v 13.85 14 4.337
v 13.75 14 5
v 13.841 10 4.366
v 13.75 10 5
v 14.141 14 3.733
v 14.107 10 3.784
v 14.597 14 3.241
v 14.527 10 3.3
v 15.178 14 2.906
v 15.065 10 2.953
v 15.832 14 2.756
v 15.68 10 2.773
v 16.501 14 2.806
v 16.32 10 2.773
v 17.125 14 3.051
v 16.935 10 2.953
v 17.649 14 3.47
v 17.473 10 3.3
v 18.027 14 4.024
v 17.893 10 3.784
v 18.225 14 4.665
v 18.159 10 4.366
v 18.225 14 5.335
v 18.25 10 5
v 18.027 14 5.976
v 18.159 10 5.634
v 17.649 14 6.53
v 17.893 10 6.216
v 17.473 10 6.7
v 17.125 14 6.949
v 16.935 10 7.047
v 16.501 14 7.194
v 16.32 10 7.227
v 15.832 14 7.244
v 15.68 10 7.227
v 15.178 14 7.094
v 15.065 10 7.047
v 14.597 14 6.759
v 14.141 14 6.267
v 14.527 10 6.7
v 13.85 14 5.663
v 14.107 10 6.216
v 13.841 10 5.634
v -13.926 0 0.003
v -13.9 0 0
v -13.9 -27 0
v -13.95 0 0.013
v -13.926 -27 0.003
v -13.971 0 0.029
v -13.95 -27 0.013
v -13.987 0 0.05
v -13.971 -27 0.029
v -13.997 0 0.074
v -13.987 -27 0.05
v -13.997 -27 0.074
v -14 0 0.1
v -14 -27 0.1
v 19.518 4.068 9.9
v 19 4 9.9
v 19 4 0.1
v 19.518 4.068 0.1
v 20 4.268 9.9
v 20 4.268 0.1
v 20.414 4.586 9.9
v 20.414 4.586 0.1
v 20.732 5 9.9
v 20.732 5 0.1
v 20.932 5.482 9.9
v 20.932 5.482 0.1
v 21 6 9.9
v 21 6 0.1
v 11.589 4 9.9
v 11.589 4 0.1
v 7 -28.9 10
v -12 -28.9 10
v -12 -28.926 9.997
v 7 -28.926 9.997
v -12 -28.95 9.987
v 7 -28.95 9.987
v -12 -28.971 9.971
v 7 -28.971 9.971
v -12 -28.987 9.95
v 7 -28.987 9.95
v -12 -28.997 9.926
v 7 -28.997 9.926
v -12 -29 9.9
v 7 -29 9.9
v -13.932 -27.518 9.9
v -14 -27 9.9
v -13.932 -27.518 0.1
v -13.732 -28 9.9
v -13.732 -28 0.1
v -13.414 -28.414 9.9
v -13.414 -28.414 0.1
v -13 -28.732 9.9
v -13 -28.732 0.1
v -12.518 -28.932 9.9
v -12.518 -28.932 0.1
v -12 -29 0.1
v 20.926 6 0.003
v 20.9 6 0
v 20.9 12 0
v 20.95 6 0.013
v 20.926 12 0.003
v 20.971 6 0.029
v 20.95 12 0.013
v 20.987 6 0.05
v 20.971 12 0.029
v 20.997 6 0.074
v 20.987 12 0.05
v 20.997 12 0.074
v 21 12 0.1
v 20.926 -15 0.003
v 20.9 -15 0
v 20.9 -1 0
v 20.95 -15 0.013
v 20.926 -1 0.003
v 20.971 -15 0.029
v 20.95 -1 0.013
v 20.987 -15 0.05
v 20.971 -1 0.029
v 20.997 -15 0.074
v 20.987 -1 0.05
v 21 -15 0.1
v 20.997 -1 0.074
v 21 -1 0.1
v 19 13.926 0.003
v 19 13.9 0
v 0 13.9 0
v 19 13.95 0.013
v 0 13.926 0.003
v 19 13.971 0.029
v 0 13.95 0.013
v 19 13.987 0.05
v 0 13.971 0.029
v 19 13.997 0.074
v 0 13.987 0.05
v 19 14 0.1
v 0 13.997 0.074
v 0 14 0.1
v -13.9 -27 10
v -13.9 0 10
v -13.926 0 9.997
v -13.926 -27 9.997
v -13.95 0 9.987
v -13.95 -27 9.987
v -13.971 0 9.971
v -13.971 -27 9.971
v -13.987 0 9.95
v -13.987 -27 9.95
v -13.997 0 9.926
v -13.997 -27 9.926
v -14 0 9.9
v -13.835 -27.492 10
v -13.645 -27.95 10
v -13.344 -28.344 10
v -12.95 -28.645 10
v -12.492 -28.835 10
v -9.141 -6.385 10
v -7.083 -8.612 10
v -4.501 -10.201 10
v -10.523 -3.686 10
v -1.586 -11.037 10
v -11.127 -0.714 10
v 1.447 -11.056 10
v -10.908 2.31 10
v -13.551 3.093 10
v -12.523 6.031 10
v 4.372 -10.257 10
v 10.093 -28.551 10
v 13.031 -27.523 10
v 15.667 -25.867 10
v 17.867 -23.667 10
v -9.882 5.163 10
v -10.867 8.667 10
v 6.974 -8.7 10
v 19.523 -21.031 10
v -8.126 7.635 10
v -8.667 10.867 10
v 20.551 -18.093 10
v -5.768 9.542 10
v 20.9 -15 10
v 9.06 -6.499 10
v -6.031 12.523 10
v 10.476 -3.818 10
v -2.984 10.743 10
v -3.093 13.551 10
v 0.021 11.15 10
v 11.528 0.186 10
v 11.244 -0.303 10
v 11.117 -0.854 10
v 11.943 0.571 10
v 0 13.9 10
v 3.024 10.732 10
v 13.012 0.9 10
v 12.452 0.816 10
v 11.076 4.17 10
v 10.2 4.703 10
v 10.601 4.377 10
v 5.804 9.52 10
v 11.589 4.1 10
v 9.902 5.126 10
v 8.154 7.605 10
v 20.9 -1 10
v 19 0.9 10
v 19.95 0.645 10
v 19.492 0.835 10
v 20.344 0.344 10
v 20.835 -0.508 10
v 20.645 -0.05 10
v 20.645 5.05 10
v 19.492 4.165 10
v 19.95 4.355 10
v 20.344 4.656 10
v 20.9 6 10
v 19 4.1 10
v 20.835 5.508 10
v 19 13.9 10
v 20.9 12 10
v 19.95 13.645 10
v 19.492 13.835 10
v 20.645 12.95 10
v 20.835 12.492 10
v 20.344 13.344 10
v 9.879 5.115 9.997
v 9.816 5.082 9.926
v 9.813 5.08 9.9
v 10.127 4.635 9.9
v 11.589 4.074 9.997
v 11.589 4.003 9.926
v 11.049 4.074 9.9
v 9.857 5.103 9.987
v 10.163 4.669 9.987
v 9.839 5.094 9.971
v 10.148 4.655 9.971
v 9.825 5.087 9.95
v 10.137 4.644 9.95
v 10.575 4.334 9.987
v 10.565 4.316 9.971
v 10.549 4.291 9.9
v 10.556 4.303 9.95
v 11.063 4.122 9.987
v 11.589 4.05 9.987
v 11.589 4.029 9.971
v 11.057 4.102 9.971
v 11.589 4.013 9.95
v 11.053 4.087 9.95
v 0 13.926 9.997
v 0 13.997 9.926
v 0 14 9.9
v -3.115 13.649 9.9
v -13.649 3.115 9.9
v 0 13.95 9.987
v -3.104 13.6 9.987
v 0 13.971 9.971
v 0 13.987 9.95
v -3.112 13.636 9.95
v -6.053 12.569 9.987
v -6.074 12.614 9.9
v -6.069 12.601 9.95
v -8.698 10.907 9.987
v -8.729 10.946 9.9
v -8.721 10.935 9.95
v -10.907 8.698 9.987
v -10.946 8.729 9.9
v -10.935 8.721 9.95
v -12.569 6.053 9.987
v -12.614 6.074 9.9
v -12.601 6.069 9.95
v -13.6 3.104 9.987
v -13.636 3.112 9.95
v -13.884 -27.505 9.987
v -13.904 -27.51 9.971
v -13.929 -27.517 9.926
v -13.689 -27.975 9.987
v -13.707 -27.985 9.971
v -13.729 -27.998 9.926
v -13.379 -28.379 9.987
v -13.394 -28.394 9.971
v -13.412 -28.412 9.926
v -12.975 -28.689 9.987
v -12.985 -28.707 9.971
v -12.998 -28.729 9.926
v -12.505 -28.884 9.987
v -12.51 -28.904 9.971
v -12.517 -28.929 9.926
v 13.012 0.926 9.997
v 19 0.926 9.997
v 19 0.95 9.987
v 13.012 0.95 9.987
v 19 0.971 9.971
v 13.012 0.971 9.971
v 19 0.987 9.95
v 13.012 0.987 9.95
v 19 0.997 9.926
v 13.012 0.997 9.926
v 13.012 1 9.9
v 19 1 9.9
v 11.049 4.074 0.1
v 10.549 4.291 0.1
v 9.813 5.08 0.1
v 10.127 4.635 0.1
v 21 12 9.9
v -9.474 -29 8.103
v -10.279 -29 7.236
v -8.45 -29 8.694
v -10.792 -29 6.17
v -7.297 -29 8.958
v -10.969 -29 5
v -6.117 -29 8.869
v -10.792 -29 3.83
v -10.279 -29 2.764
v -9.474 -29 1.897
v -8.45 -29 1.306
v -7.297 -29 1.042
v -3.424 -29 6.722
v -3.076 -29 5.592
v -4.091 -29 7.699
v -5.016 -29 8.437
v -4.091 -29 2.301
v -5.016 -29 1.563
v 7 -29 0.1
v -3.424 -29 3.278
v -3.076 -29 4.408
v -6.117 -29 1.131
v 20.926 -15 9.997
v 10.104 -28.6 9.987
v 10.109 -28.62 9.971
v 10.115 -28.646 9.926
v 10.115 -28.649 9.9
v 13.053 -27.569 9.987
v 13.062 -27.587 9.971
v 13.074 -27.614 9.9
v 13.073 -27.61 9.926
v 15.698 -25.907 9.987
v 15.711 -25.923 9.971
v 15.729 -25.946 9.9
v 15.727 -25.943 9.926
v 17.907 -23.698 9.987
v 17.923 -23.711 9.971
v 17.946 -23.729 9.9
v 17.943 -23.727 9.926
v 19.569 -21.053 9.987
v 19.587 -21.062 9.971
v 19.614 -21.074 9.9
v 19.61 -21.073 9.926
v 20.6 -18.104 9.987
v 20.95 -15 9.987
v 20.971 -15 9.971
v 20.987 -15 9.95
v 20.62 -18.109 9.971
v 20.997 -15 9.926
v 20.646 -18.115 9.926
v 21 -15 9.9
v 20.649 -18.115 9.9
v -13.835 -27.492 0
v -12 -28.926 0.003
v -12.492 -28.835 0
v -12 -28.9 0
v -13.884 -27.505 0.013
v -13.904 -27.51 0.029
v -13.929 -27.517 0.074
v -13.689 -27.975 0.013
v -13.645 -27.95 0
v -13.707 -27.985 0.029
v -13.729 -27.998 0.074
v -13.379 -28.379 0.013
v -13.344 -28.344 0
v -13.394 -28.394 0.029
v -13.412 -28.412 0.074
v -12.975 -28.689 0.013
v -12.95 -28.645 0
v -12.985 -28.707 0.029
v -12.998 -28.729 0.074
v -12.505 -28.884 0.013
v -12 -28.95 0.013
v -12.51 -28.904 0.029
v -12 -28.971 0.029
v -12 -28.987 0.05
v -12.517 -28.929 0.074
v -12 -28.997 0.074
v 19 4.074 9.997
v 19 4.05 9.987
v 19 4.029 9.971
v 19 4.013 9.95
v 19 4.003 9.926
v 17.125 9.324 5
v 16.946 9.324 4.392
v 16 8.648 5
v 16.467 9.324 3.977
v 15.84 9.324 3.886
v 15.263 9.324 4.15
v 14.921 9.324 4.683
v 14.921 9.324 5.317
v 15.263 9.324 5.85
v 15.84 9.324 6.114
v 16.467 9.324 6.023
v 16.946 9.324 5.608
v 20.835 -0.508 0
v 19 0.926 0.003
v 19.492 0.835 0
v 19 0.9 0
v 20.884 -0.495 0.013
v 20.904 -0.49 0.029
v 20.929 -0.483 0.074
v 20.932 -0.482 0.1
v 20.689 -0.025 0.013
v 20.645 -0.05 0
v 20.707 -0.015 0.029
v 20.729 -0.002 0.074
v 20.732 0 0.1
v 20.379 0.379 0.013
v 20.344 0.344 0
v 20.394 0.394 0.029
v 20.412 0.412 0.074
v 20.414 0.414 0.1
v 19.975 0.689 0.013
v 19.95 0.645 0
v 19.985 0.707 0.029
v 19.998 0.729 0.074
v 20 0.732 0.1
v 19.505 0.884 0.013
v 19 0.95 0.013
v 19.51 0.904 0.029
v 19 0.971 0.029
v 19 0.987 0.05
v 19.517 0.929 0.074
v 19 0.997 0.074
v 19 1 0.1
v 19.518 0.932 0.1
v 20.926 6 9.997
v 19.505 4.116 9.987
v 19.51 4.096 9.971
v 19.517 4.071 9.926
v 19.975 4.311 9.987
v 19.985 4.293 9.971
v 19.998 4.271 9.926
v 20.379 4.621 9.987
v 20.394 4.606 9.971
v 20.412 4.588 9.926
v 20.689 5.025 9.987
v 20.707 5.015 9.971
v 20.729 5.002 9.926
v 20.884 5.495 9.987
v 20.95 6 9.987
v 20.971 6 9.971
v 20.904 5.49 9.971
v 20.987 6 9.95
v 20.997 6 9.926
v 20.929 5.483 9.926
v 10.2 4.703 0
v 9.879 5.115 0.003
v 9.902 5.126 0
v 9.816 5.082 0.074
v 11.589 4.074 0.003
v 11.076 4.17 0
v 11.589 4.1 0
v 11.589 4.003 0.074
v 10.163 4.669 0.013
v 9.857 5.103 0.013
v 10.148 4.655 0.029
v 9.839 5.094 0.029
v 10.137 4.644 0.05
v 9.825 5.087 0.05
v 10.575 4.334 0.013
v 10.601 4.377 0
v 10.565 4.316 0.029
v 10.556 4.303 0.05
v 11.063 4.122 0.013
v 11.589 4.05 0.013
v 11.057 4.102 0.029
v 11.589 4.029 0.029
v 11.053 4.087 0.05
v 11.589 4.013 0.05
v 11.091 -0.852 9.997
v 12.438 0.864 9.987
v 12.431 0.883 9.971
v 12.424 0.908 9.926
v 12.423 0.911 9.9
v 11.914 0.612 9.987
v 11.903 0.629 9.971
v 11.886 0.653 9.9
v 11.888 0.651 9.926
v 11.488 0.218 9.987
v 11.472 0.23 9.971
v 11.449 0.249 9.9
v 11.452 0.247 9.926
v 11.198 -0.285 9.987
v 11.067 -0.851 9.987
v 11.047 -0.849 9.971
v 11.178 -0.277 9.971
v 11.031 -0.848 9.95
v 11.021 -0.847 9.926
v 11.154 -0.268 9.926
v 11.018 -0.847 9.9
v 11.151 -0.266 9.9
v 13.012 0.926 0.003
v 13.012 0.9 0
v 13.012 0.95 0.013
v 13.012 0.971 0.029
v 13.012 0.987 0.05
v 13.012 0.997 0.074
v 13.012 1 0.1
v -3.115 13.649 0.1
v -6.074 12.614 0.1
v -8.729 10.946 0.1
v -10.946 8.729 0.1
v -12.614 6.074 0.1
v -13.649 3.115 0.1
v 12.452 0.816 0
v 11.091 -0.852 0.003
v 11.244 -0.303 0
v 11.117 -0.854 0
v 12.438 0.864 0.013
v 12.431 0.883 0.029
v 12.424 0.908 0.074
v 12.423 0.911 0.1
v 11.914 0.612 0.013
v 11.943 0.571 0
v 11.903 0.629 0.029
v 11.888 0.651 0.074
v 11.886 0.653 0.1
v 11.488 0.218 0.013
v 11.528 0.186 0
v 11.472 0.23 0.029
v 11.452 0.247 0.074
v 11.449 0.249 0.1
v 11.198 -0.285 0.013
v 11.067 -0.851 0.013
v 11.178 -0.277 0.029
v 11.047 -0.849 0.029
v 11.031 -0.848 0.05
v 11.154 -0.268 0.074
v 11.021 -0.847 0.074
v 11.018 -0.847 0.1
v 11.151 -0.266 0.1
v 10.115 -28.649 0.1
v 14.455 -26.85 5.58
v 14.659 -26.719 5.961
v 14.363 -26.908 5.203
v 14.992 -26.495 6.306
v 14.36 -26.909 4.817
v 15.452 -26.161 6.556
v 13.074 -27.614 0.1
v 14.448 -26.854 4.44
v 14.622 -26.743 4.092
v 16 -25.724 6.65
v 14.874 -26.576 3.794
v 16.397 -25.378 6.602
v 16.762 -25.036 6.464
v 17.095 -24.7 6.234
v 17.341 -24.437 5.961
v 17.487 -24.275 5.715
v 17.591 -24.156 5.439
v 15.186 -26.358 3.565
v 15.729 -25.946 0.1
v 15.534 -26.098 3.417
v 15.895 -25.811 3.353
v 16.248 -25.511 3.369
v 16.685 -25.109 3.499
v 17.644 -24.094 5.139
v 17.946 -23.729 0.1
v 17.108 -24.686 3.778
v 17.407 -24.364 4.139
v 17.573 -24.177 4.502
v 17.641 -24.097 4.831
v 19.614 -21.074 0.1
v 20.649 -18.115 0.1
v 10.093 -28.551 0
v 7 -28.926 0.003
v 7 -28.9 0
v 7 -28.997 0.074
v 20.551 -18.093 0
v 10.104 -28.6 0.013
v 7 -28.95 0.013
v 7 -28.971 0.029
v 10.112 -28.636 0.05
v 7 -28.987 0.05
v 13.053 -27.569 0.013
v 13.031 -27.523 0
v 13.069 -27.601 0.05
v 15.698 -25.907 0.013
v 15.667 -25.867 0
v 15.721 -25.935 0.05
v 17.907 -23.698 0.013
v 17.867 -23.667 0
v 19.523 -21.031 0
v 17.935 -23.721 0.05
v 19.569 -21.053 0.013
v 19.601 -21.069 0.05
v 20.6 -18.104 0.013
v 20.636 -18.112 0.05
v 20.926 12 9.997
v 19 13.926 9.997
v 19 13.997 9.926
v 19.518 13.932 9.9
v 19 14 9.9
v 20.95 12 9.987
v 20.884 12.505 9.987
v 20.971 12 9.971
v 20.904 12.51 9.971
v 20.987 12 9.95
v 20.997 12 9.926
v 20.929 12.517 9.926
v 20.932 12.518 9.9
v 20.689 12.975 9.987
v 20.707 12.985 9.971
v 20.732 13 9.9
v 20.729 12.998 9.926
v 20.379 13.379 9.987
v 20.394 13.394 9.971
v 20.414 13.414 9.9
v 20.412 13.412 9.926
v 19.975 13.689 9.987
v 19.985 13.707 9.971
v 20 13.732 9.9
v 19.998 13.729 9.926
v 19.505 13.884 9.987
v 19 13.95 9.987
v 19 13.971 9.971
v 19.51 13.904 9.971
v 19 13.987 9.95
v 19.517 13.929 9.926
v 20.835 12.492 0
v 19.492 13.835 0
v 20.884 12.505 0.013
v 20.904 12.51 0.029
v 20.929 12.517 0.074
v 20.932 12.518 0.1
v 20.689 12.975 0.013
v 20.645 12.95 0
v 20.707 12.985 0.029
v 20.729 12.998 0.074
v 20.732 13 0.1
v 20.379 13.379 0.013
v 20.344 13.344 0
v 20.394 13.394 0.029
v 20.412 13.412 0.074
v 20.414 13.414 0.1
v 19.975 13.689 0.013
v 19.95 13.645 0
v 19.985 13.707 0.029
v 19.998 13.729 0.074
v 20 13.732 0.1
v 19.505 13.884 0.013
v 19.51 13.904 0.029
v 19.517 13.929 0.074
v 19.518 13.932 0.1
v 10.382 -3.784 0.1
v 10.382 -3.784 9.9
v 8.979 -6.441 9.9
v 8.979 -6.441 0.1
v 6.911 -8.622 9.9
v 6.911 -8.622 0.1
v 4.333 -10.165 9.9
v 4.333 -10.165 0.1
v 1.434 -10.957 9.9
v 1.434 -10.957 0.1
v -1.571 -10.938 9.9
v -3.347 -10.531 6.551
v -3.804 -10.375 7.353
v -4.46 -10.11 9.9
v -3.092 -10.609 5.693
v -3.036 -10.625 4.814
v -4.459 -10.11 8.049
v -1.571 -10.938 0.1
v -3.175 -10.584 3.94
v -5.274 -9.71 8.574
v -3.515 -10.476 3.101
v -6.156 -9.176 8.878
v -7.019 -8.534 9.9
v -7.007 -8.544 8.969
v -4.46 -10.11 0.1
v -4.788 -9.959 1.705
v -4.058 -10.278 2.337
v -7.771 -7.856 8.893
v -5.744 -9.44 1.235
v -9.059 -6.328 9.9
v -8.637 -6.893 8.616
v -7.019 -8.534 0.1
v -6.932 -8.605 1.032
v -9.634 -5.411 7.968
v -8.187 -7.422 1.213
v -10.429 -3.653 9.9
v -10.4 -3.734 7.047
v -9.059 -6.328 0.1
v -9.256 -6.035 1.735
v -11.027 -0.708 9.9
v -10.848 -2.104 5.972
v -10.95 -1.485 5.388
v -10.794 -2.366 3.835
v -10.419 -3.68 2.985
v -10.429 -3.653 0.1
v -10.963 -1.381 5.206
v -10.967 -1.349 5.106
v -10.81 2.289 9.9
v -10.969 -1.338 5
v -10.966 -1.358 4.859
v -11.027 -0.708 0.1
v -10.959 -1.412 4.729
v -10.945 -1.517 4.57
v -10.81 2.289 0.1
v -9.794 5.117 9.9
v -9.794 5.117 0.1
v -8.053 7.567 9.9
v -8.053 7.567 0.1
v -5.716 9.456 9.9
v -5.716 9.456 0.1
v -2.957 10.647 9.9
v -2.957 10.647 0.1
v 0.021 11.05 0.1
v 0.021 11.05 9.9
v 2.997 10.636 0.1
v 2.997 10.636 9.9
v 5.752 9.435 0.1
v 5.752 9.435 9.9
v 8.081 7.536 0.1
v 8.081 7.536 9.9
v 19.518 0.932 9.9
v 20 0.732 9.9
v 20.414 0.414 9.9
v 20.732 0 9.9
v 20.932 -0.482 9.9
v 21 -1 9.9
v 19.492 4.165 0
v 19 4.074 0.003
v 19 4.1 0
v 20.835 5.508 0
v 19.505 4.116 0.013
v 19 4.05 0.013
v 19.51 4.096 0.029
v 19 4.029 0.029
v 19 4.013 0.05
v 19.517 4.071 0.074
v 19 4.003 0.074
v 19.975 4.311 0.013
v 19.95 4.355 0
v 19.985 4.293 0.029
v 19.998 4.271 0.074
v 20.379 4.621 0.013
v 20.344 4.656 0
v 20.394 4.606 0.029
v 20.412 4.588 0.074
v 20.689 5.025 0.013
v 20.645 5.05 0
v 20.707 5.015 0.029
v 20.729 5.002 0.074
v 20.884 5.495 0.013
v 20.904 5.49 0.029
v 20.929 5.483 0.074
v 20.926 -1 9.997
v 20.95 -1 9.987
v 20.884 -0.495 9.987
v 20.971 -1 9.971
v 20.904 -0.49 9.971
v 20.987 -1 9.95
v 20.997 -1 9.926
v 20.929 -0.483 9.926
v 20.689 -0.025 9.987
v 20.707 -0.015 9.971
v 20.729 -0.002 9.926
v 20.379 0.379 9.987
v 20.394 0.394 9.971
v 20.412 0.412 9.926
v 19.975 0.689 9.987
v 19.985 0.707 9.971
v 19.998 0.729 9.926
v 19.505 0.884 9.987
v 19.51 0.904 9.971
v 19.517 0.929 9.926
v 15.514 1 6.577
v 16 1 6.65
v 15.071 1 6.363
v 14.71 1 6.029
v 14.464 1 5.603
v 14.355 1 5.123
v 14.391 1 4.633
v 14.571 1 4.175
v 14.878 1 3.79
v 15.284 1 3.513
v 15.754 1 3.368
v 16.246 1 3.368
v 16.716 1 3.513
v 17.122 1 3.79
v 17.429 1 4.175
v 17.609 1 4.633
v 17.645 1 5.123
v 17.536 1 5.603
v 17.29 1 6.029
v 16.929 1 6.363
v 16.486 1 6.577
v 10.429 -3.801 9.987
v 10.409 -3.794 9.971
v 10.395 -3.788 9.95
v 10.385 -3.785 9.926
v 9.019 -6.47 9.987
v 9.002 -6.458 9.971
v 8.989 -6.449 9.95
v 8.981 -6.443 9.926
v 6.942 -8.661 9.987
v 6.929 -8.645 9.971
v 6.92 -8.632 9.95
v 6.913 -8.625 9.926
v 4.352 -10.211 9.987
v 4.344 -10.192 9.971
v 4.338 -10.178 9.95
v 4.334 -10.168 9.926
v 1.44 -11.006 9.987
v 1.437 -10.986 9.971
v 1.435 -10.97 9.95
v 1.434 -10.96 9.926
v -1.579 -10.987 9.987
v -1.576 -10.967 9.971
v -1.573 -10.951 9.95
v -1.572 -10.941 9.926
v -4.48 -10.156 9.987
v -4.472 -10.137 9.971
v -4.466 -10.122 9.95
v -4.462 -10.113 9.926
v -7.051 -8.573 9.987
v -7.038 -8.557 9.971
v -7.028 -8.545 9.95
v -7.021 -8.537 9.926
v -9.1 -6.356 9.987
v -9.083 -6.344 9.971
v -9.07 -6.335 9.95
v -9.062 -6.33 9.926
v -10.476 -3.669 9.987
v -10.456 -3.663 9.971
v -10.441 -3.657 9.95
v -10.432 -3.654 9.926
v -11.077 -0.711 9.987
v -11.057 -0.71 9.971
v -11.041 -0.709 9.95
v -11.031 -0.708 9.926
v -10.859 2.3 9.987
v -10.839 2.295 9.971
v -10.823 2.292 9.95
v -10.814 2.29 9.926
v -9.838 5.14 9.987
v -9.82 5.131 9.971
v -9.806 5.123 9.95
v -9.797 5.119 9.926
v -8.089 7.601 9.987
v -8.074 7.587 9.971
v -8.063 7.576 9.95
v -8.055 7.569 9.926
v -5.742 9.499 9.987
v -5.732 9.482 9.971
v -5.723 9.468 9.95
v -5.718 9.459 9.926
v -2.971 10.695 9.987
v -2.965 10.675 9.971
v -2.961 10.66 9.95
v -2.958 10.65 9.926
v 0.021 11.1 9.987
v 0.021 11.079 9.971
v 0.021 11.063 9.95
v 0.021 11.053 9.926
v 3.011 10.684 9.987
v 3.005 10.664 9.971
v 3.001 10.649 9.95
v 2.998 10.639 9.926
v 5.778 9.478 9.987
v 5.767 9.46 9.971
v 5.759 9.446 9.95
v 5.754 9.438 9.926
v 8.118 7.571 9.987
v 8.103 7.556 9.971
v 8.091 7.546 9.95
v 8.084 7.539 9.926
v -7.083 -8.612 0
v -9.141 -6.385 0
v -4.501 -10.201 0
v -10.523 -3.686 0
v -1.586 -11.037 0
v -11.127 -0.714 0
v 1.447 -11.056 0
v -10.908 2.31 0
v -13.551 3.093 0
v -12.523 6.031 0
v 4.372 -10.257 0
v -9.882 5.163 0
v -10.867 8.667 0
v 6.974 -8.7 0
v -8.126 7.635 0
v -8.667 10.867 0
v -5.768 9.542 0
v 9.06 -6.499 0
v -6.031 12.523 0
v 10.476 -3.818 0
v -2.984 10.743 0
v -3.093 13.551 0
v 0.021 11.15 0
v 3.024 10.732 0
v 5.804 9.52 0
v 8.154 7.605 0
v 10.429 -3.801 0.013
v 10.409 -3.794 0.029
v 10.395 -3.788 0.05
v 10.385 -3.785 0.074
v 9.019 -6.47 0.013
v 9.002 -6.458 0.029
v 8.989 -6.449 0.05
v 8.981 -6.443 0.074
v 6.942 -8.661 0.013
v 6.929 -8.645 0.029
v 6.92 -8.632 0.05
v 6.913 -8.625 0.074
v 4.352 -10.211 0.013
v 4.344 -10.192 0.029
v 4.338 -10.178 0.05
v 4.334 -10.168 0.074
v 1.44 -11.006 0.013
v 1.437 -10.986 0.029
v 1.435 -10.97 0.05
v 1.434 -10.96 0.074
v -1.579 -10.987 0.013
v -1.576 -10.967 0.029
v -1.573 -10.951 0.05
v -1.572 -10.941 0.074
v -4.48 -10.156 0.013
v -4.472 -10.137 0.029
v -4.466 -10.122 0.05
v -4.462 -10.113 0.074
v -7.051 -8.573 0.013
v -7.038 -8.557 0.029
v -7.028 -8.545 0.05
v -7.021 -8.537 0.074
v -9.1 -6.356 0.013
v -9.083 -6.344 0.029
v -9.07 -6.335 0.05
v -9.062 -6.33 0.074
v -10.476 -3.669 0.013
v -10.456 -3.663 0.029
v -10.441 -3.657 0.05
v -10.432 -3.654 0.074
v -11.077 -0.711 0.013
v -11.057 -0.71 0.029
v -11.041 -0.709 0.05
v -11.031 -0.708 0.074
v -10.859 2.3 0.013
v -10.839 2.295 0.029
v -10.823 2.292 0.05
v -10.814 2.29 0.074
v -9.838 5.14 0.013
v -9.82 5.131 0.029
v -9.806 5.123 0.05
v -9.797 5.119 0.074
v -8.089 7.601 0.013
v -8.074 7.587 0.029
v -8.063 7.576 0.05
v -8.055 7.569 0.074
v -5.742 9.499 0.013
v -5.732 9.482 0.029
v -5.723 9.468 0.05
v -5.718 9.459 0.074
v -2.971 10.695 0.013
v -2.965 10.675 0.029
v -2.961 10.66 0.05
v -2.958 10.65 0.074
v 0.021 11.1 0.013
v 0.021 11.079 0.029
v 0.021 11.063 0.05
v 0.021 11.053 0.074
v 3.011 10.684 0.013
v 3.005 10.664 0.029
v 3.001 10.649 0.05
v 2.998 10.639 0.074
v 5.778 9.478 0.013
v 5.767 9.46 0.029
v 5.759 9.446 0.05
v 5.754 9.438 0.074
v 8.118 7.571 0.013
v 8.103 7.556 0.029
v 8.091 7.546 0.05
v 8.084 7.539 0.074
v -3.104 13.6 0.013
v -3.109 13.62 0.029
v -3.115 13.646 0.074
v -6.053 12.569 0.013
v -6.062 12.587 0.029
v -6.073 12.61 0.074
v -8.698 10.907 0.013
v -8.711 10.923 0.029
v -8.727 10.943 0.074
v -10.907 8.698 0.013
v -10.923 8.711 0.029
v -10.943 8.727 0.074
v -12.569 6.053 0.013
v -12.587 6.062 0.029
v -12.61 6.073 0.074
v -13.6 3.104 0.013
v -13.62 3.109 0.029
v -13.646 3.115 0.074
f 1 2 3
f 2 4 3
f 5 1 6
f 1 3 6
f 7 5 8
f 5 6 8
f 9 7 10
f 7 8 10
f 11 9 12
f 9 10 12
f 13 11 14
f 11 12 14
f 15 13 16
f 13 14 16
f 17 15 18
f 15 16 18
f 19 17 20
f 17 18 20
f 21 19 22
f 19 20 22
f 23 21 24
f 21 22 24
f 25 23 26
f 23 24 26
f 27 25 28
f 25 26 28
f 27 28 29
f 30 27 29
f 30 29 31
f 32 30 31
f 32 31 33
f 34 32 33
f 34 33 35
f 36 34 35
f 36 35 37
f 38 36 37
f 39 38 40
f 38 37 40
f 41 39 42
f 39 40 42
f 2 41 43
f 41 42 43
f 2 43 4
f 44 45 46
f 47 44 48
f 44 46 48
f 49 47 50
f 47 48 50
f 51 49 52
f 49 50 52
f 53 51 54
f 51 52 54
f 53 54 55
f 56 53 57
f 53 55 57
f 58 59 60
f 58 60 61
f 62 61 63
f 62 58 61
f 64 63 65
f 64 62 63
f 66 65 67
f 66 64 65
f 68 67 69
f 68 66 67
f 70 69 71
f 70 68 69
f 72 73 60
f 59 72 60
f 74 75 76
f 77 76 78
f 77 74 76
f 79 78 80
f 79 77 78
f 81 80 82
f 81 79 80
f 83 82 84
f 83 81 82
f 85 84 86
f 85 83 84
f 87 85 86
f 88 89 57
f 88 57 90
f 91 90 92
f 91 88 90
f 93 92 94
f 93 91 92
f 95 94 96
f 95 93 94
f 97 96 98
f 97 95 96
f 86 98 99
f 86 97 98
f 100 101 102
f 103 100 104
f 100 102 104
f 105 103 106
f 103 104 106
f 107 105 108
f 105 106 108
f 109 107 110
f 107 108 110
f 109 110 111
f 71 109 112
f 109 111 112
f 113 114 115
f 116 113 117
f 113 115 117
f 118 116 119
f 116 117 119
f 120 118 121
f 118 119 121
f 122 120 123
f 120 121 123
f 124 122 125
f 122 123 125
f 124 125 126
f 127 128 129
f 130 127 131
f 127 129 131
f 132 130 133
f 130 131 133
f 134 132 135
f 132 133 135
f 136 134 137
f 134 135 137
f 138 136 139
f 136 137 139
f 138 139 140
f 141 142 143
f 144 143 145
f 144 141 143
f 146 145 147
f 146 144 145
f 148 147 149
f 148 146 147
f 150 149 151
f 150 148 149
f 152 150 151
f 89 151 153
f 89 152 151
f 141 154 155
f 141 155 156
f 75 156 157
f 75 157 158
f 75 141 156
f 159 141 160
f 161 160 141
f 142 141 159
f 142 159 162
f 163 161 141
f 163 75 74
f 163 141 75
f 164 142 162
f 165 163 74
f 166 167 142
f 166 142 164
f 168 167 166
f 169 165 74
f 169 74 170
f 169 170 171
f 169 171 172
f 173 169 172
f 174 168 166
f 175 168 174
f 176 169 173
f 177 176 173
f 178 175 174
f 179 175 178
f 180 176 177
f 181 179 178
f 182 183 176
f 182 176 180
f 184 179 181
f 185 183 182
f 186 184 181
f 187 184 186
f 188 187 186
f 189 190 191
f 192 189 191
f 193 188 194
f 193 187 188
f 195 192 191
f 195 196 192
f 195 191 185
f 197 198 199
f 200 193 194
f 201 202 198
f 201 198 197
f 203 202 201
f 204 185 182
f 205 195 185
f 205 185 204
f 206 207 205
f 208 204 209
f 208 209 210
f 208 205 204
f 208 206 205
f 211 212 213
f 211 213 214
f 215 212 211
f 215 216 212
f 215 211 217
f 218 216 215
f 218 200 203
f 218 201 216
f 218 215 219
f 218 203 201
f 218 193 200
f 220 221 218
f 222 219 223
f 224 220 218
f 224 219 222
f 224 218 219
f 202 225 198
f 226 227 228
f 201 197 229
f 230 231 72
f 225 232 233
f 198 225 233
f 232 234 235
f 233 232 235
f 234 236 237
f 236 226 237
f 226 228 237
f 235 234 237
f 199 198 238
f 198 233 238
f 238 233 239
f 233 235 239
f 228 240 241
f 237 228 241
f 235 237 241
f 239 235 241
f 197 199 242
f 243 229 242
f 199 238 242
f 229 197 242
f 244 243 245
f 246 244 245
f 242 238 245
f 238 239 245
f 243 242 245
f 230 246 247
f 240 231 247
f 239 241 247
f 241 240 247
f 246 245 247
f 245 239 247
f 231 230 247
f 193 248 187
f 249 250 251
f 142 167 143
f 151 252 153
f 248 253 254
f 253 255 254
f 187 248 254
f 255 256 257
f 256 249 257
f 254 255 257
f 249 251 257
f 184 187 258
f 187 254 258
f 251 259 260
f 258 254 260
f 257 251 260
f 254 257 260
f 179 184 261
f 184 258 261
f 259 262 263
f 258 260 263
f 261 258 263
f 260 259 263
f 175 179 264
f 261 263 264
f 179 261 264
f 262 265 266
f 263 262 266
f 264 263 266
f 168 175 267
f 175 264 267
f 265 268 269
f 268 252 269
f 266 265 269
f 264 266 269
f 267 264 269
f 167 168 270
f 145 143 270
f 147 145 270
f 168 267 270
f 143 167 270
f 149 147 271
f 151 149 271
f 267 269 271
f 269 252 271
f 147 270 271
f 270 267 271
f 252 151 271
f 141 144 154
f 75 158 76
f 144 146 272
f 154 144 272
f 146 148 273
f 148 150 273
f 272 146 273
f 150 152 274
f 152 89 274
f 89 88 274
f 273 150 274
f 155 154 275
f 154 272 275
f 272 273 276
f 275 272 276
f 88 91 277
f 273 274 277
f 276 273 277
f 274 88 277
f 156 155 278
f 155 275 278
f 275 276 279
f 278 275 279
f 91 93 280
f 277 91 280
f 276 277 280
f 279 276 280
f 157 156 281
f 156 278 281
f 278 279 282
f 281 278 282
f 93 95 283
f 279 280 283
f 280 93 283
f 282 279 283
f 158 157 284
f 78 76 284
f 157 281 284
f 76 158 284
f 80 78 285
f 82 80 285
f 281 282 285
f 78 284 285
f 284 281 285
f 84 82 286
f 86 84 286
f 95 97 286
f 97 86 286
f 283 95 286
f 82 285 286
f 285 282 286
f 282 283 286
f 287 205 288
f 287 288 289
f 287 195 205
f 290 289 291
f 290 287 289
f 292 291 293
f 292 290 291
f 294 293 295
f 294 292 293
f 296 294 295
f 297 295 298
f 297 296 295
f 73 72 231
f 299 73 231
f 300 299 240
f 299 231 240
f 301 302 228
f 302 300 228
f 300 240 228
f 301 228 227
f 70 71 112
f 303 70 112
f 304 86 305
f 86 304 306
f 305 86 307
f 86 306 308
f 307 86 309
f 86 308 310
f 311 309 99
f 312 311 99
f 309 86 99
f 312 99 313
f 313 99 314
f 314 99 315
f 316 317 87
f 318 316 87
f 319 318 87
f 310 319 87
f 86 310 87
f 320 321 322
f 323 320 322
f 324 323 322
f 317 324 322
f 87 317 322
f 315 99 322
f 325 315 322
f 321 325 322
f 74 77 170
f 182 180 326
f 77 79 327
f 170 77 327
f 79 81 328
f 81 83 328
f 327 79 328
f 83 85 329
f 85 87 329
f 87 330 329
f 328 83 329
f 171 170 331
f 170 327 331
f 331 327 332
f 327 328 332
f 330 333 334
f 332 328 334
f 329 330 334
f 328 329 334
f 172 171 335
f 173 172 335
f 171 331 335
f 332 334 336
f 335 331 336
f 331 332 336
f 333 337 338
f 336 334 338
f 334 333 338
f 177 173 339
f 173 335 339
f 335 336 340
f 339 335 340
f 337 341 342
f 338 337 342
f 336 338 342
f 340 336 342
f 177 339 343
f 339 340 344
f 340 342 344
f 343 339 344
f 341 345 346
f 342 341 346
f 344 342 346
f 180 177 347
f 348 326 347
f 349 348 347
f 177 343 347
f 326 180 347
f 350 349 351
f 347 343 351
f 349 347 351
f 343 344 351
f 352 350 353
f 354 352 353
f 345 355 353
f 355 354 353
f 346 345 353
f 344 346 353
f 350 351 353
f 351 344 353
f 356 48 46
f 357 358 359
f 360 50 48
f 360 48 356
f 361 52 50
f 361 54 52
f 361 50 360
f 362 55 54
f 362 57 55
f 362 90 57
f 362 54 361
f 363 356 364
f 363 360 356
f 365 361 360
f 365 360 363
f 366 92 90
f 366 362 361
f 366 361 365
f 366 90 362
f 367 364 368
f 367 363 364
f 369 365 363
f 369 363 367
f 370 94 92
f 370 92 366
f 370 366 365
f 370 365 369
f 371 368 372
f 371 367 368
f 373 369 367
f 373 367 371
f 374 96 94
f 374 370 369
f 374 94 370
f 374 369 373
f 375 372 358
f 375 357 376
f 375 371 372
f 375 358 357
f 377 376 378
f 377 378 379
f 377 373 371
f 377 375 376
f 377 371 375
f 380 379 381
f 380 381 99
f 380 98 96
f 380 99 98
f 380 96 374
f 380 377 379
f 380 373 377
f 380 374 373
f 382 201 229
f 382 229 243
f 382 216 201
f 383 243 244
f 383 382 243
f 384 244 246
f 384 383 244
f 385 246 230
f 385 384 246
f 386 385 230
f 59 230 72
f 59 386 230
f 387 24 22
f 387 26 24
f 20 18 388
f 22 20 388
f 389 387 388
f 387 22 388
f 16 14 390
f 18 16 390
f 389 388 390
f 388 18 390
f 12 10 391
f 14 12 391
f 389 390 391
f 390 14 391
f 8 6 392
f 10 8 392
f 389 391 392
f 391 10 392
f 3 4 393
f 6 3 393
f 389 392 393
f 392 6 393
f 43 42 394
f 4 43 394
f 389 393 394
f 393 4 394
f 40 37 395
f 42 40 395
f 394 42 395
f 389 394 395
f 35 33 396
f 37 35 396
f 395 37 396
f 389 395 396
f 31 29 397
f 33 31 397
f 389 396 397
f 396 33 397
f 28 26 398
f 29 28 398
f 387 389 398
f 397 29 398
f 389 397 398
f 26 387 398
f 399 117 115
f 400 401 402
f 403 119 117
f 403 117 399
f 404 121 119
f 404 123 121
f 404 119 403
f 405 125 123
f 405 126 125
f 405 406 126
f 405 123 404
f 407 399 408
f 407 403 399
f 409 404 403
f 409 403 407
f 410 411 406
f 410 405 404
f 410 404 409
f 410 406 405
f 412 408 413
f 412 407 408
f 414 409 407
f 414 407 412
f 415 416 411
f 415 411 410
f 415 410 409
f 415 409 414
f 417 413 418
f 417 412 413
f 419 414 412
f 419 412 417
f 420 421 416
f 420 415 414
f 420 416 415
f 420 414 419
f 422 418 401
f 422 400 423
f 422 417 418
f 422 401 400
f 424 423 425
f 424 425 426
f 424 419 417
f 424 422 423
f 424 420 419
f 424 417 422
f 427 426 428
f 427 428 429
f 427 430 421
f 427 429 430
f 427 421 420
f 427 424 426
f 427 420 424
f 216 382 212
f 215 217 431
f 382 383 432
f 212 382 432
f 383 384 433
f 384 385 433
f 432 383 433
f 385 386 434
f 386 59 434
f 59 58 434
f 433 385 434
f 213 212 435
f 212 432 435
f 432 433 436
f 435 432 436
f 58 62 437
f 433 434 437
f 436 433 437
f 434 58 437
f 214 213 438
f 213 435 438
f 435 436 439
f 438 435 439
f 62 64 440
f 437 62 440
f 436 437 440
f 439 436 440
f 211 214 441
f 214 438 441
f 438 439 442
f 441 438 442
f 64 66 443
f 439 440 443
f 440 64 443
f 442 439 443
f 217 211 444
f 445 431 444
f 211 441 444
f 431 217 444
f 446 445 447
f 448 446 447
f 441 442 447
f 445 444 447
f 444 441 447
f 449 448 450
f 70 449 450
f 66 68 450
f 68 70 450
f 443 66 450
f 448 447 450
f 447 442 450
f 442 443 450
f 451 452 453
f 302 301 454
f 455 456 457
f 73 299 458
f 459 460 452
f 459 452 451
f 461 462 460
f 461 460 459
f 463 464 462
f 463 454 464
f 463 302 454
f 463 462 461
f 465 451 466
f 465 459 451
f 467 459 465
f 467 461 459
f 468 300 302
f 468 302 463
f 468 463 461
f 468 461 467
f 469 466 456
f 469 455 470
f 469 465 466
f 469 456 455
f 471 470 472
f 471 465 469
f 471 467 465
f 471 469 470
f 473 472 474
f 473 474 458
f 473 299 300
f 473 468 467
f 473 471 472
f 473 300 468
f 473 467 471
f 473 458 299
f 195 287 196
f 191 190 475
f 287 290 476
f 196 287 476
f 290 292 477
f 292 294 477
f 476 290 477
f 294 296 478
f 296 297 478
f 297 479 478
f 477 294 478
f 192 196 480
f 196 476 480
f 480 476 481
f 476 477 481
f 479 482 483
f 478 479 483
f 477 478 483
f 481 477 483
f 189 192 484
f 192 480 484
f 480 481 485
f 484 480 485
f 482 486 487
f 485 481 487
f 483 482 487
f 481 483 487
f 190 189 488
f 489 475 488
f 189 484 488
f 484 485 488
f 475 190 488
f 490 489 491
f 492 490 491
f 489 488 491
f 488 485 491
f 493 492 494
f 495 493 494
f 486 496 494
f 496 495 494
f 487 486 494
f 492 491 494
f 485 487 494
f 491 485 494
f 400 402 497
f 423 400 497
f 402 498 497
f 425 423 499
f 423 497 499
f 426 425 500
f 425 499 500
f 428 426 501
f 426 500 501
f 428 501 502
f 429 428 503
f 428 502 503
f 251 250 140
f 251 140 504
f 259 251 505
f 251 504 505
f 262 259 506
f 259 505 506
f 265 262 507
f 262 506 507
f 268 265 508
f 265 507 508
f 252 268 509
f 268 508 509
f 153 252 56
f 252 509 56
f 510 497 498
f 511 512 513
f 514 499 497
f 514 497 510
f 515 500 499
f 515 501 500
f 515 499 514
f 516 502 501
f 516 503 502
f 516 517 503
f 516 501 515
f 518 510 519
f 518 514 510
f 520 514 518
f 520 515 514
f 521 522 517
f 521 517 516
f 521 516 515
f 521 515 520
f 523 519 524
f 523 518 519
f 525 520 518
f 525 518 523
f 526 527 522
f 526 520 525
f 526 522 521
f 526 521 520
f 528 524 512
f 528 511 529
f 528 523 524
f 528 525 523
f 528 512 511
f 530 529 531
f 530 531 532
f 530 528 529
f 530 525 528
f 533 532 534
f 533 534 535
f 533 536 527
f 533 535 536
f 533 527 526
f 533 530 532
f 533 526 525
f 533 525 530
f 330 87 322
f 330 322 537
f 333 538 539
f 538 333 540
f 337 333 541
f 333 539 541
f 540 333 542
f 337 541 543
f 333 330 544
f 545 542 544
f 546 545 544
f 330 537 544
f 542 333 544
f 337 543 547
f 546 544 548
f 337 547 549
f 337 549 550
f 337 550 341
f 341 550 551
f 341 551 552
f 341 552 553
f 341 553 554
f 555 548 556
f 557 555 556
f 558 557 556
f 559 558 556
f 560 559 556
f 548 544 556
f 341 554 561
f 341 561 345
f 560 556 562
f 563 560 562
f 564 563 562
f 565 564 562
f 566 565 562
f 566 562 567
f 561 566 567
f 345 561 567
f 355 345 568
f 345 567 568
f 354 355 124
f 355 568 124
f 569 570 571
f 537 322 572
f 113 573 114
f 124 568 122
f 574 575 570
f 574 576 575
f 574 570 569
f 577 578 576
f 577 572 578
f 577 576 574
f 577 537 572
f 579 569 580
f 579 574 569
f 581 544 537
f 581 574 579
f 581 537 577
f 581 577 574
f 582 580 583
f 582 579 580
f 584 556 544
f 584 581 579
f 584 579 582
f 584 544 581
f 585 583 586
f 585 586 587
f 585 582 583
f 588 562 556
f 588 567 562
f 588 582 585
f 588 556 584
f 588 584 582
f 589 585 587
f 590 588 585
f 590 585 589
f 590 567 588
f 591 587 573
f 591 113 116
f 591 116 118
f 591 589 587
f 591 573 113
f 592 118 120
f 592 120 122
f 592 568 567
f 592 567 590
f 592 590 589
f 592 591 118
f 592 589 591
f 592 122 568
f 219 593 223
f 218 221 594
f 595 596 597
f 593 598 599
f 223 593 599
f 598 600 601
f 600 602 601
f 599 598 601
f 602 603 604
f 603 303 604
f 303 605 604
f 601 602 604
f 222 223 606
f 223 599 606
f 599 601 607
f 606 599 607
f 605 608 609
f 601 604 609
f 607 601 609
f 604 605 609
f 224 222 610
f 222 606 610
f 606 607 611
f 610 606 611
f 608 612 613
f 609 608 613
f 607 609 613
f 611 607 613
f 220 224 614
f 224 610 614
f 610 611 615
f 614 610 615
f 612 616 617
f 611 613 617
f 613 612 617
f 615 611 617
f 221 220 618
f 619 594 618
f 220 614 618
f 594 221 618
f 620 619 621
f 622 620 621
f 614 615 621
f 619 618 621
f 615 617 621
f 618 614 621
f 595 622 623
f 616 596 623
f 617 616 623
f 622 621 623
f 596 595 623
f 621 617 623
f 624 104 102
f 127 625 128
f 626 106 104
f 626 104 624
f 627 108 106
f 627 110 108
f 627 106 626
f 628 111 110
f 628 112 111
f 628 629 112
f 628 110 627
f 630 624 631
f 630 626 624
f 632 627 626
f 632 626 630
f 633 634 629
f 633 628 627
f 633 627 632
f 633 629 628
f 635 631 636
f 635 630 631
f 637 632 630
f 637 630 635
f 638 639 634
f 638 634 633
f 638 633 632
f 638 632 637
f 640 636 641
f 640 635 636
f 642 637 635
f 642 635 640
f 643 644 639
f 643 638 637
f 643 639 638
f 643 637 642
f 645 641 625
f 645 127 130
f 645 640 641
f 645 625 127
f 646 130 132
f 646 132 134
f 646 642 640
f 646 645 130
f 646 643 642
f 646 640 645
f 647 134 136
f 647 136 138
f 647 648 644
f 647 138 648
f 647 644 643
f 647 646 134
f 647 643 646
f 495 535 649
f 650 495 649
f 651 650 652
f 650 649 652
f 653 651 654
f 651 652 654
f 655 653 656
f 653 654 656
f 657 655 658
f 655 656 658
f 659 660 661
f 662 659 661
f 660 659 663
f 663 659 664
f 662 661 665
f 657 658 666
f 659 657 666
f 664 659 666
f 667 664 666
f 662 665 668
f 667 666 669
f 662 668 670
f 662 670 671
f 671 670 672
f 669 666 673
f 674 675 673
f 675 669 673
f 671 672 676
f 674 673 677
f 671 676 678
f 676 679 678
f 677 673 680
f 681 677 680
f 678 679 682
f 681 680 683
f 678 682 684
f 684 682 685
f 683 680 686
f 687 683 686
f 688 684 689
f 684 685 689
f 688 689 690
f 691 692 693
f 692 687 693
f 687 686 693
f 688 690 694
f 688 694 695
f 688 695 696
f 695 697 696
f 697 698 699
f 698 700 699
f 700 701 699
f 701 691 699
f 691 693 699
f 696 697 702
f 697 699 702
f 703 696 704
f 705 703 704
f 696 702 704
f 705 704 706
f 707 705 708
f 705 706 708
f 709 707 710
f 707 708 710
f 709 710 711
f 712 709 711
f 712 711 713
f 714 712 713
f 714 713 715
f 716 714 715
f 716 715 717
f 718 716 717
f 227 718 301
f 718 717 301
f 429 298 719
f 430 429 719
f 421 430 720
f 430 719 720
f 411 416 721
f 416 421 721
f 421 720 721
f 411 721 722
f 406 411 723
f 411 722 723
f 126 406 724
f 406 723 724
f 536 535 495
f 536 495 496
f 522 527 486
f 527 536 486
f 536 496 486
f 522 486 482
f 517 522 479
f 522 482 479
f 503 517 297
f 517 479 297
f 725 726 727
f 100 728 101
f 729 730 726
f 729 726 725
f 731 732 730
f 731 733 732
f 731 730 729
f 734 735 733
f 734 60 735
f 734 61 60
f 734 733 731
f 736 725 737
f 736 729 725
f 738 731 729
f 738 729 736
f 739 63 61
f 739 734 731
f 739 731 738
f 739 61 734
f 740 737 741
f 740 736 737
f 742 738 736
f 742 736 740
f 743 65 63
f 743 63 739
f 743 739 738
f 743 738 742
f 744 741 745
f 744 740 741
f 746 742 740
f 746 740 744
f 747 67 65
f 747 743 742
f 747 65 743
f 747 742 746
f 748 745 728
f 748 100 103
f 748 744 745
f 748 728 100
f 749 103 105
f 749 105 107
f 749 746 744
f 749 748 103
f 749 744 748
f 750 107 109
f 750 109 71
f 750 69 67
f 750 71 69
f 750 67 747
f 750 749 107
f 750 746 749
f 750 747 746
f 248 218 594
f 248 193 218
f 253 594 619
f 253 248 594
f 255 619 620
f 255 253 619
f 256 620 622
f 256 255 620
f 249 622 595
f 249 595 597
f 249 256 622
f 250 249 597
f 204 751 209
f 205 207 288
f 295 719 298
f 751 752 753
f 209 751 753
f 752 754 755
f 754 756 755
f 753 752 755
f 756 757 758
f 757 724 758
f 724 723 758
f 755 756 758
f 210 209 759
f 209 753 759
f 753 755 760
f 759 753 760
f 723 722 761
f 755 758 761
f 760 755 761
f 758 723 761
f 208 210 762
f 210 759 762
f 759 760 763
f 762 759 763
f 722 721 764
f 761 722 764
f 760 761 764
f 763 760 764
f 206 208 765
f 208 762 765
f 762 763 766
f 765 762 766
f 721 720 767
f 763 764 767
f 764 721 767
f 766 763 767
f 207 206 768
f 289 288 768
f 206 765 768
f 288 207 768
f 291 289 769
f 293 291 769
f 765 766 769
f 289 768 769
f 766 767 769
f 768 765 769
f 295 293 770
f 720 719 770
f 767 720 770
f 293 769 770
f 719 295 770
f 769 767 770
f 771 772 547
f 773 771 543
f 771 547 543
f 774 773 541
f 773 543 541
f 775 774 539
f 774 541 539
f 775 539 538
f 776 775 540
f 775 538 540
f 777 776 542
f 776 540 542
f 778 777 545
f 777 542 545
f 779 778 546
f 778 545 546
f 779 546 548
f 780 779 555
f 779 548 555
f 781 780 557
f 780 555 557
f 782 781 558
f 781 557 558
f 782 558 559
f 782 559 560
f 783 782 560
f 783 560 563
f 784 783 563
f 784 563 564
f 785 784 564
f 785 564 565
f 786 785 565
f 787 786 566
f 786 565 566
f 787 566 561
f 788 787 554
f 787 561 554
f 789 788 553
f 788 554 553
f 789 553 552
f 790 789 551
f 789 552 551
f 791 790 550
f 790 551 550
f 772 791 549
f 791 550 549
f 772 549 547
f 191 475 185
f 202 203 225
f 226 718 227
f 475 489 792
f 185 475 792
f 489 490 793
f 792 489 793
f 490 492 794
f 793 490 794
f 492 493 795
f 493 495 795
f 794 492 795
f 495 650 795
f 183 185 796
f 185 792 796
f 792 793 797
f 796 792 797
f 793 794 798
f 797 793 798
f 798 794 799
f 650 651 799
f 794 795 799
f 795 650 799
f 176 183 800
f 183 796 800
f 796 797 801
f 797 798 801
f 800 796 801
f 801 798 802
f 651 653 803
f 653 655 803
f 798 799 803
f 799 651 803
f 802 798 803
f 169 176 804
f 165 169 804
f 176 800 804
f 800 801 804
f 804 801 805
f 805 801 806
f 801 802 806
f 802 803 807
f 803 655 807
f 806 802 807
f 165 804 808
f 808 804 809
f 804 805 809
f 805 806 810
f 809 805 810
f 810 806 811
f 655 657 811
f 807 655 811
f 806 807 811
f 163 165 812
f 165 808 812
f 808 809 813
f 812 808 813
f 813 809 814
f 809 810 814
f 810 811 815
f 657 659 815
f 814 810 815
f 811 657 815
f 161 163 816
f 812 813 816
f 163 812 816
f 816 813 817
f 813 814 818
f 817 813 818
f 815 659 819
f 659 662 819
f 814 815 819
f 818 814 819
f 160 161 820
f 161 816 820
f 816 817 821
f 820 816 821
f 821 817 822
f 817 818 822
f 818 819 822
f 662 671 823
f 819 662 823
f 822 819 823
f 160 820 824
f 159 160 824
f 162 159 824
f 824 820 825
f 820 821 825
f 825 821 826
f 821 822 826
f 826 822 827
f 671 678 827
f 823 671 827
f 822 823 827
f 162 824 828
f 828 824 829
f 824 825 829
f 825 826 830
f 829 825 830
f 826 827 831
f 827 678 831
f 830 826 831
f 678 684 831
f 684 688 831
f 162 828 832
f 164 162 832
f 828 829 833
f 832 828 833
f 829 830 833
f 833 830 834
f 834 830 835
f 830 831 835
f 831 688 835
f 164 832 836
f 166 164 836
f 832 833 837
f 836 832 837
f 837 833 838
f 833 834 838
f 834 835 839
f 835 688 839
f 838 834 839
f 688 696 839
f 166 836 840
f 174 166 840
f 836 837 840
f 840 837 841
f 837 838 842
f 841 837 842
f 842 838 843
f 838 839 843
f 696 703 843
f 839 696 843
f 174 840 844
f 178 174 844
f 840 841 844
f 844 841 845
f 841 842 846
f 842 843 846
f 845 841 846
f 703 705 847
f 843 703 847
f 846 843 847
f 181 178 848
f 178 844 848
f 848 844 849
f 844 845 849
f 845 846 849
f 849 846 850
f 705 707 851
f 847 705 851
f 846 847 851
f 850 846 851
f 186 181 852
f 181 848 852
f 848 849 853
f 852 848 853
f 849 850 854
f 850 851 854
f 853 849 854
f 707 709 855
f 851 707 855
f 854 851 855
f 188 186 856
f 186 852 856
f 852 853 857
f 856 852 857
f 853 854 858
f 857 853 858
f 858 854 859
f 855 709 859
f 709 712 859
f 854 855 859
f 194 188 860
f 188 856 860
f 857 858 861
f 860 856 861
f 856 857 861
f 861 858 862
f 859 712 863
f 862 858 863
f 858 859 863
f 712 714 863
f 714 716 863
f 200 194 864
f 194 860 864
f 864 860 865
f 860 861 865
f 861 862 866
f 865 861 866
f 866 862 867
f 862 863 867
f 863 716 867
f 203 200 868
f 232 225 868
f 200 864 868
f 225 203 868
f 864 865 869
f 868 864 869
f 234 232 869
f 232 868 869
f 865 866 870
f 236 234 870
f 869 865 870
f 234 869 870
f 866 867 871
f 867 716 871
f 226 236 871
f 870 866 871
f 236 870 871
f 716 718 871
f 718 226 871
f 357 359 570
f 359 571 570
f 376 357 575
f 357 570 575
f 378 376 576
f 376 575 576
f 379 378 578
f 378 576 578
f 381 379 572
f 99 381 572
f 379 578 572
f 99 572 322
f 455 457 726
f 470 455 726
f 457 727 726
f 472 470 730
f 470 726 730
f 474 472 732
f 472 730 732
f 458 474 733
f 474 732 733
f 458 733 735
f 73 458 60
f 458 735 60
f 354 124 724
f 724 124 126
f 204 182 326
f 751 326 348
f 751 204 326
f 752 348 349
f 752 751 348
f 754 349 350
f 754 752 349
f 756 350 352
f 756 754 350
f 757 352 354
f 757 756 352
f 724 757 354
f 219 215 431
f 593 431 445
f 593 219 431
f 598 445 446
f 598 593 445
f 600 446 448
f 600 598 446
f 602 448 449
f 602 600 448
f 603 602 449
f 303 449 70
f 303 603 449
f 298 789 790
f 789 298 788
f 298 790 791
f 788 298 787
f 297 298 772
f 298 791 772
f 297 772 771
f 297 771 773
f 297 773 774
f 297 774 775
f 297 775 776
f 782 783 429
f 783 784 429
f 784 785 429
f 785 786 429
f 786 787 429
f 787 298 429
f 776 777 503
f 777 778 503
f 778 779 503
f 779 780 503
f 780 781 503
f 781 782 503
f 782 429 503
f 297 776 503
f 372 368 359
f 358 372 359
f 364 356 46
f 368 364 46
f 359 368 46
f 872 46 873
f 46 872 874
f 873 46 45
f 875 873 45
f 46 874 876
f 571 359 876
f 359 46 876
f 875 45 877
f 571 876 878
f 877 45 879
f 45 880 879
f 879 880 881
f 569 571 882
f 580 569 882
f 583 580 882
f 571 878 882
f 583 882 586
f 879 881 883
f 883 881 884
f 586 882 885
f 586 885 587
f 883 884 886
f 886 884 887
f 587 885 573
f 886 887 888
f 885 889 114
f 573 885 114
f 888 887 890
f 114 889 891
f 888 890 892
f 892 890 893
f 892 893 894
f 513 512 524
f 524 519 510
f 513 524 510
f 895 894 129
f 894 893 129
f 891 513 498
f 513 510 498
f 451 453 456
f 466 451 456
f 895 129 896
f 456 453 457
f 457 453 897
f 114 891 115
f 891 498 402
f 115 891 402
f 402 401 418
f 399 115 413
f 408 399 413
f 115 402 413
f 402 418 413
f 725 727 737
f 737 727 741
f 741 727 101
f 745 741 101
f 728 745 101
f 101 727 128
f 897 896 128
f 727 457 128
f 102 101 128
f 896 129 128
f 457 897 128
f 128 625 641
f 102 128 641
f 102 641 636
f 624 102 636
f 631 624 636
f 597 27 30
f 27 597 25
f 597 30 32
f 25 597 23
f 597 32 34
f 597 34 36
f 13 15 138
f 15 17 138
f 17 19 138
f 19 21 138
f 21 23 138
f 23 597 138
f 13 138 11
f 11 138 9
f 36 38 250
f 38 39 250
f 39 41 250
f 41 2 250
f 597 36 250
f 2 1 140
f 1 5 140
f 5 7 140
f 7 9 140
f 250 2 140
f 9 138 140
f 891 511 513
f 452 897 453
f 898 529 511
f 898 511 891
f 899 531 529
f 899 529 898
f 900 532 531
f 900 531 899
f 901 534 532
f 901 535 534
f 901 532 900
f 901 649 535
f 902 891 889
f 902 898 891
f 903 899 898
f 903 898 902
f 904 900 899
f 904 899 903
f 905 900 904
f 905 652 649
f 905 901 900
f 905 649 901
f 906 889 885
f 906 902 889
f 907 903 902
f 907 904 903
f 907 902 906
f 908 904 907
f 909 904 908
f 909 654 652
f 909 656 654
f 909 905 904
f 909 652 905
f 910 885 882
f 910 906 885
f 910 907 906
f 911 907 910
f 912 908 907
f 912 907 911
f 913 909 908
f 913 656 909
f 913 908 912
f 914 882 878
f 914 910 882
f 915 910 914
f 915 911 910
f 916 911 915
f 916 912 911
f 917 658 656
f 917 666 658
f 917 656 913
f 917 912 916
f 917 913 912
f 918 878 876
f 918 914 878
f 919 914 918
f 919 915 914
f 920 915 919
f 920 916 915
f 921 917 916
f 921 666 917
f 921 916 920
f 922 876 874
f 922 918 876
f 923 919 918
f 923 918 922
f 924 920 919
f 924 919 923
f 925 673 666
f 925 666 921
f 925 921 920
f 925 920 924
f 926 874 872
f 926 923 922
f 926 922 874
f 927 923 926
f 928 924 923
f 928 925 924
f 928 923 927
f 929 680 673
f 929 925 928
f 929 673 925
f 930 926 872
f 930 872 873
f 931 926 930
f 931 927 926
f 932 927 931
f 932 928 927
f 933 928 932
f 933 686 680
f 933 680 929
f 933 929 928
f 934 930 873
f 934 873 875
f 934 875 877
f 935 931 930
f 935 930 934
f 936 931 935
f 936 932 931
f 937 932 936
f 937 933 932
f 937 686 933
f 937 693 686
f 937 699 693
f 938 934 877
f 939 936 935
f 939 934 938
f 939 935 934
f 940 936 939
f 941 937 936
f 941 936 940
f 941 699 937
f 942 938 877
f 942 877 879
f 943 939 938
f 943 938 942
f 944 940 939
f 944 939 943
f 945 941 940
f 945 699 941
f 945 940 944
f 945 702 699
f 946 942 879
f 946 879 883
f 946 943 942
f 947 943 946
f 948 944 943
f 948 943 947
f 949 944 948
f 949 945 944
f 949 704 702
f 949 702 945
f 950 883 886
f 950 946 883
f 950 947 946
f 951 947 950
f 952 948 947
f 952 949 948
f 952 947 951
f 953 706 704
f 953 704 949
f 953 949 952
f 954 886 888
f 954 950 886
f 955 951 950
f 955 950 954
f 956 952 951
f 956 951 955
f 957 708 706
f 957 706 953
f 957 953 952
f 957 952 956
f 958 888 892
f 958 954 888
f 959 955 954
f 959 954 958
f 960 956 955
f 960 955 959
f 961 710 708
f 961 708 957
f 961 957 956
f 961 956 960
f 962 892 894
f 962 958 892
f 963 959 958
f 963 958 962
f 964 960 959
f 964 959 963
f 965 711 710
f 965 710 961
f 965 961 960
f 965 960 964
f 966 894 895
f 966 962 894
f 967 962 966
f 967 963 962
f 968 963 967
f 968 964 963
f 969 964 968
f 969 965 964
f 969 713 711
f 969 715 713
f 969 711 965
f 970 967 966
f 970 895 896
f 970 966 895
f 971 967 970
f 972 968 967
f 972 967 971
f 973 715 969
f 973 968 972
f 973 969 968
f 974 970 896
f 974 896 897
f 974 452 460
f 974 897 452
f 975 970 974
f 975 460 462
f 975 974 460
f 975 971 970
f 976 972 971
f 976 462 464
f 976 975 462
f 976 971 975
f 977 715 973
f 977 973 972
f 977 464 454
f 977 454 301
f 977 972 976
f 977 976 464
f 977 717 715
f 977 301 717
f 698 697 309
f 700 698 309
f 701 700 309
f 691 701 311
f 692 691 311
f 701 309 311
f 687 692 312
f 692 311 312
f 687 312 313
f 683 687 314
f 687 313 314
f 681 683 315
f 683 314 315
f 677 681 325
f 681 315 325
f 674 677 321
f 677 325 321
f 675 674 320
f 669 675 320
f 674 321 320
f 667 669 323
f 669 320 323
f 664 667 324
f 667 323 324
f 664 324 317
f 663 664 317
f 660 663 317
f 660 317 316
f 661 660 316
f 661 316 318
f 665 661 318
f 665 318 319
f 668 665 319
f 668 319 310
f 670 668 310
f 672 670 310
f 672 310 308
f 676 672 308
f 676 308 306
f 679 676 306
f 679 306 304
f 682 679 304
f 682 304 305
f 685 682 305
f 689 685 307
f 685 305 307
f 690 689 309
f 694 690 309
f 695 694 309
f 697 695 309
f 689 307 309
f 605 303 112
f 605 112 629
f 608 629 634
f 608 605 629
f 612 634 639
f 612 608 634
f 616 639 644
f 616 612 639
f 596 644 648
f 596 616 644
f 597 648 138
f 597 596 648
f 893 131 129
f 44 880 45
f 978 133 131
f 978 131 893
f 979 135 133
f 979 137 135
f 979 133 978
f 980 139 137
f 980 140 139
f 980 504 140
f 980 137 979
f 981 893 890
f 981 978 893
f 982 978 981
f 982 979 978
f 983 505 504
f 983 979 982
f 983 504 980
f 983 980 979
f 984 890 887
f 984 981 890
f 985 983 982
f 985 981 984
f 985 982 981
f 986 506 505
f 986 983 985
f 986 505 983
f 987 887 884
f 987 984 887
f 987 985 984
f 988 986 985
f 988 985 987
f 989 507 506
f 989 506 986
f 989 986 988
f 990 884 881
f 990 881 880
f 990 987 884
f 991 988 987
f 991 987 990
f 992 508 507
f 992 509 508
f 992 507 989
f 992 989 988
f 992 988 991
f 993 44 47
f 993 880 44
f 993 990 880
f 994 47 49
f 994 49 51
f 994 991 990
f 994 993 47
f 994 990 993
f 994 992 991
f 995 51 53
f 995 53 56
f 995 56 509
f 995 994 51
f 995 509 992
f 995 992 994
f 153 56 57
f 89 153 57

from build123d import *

# Parameters (mm, degrees)
EXTRUDE_1_DEPTH            = 10
HOLE_WIZARD_M41_D          = 4.5
HOLE_WIZARD_M41_DEPTH      = 4
HOLE_WIZARD_M41_TIP        = 1.351936393
SKETCH_5_W                 = 1.65
SKETCH_5_H                 = 30
HOLE_WIZARD_3_8_161_REACH  = 50.888
HOLE_WIZARD_3_8_161_BORE_R = 3.96875
FILLET_1_R                 = 2
FILLET_2_R                 = 0.1


with BuildPart() as part:
    # Эскиз1 → Бобышка-Вытянуть1 (new body)
    with BuildSketch(Plane.XY):
        with BuildLine():
            Line((10.300606778, 4), (21, 4))
            Line((21, 4), (21, 14))
            Line((21, 14), (0, 14))
            ThreePointArc((0, 14), (-9.899494937, 9.899494937), (-14, 0))
            Line((-14, 0), (-14, -29))
            Line((-14, -29), (7, -29))
            ThreePointArc((7, -29), (16.899494937, -24.899494937), (21, -15))
            Line((21, -15), (21, 1))
            Line((21, 1), (11.004658105, 1))
            ThreePointArc((11.004658105, 1), (-10.757721782, -2.524662763), (10.300606778, 4))
        make_face()
    extrude(amount=EXTRUDE_1_DEPTH)

    # Отверстие с зазором M41
    with Locations(Plane(origin=(0, 14, 0), x_dir=(1, 0, 0), z_dir=(0, 1, 0))):
        with Locations((16, -5)):
            Hole(HOLE_WIZARD_M41_D / 2, depth=HOLE_WIZARD_M41_DEPTH)
            with Locations((0, 0, -(HOLE_WIZARD_M41_DEPTH + HOLE_WIZARD_M41_TIP / 2))):  # 118° drill point
                Cone(0, HOLE_WIZARD_M41_D / 2, HOLE_WIZARD_M41_TIP, mode=Mode.SUBTRACT)

    # Эскиз5 → Отверстие обработанное метчиком M4x0.71 (revolve, cut)
    with BuildSketch(Plane(origin=(16, 1, 5), x_dir=(0, 0, 1), z_dir=(1, 0, 0))):
        with Locations((0.825, 15)):
            Rectangle(SKETCH_5_W, SKETCH_5_H)
    revolve(axis=Axis((16, 7.35, 5), (0, -1, 0)), mode=Mode.SUBTRACT)

    # Отверстие обработанное метчиком 3/8-161 bore → Отверстие обработанное метчиком 3/8-161 (cut, up to next)
    with BuildSketch(Plane(origin=(0, -29, 0), x_dir=(-1, 0, 0), z_dir=(0, -1, 0)), mode=Mode.PRIVATE) as hole_wizard_3_8_161_sk1:
        with Locations((7, -5)):
            Circle(HOLE_WIZARD_3_8_161_BORE_R)
    hole_wizard_3_8_161_tool1 = extrude(hole_wizard_3_8_161_sk1.sketch, amount=-HOLE_WIZARD_3_8_161_REACH, mode=Mode.PRIVATE) & part.part
    add(hole_wizard_3_8_161_tool1.solids().sort_by_distance((-7, -29, 5))[0], mode=Mode.SUBTRACT)

    # Скругление1
    fillet_1_edges = [part.edges().sort_by_distance(p)[0] for p in [
        (11.004658105, 1, 5),
        (21, 1, 5),
        (-14, -29, 5),
        (21, 14, 5),
        (21, 4, 5),
        (10.300606778, 4, 5),
    ]]
    fillet(fillet_1_edges, radius=FILLET_1_R)

    # Скругление2
    fillet_2_edges = [part.edges().sort_by_distance(p)[0] for p in [
        (16.899494937, -24.899494937, 0),
        (-14, -13.5, 0),
        (-9.899494937, 9.899494937, 0),
        (-9.899494937, 9.899494937, 10),
        (-14, -13.5, 10),
        (16.899494937, -24.899494937, 10),
        (21, -8, 10),
        (-2.5, -29, 0),
        (-2.5, -29, 10),
        (-10.828600624, -2.20088812, 0),
        (16.005814707, 1, 0),
        (9.5, 14, 0),
        (21, 9, 0),
        (15.294447774, 4, 0),
        (10.549443879, 4.291333786, 0),
        (11.652680079, 0.467397937, 0),
        (20.414213562, 0.414213562, 0),
        (20.414213562, 4.585786438, 0),
        (20.414213562, 13.414213562, 0),
        (-13.414213562, -28.414213562, 0),
        (-10.828600624, -2.20088812, 10),
        (15.294447774, 4, 10),
        (21, 9, 10),
        (9.5, 14, 10),
        (16.005814707, 1, 10),
        (10.549443879, 4.291333786, 10),
        (11.652680079, 0.467397937, 10),
        (20.414213562, 0.414213562, 10),
        (20.414213562, 4.585786438, 10),
        (20.414213562, 13.414213562, 10),
        (-13.414213562, -28.414213562, 10),
        (21, -8, 0),
    ]]
    fillet(fillet_2_edges, radius=FILLET_2_R)


solid = part.part
